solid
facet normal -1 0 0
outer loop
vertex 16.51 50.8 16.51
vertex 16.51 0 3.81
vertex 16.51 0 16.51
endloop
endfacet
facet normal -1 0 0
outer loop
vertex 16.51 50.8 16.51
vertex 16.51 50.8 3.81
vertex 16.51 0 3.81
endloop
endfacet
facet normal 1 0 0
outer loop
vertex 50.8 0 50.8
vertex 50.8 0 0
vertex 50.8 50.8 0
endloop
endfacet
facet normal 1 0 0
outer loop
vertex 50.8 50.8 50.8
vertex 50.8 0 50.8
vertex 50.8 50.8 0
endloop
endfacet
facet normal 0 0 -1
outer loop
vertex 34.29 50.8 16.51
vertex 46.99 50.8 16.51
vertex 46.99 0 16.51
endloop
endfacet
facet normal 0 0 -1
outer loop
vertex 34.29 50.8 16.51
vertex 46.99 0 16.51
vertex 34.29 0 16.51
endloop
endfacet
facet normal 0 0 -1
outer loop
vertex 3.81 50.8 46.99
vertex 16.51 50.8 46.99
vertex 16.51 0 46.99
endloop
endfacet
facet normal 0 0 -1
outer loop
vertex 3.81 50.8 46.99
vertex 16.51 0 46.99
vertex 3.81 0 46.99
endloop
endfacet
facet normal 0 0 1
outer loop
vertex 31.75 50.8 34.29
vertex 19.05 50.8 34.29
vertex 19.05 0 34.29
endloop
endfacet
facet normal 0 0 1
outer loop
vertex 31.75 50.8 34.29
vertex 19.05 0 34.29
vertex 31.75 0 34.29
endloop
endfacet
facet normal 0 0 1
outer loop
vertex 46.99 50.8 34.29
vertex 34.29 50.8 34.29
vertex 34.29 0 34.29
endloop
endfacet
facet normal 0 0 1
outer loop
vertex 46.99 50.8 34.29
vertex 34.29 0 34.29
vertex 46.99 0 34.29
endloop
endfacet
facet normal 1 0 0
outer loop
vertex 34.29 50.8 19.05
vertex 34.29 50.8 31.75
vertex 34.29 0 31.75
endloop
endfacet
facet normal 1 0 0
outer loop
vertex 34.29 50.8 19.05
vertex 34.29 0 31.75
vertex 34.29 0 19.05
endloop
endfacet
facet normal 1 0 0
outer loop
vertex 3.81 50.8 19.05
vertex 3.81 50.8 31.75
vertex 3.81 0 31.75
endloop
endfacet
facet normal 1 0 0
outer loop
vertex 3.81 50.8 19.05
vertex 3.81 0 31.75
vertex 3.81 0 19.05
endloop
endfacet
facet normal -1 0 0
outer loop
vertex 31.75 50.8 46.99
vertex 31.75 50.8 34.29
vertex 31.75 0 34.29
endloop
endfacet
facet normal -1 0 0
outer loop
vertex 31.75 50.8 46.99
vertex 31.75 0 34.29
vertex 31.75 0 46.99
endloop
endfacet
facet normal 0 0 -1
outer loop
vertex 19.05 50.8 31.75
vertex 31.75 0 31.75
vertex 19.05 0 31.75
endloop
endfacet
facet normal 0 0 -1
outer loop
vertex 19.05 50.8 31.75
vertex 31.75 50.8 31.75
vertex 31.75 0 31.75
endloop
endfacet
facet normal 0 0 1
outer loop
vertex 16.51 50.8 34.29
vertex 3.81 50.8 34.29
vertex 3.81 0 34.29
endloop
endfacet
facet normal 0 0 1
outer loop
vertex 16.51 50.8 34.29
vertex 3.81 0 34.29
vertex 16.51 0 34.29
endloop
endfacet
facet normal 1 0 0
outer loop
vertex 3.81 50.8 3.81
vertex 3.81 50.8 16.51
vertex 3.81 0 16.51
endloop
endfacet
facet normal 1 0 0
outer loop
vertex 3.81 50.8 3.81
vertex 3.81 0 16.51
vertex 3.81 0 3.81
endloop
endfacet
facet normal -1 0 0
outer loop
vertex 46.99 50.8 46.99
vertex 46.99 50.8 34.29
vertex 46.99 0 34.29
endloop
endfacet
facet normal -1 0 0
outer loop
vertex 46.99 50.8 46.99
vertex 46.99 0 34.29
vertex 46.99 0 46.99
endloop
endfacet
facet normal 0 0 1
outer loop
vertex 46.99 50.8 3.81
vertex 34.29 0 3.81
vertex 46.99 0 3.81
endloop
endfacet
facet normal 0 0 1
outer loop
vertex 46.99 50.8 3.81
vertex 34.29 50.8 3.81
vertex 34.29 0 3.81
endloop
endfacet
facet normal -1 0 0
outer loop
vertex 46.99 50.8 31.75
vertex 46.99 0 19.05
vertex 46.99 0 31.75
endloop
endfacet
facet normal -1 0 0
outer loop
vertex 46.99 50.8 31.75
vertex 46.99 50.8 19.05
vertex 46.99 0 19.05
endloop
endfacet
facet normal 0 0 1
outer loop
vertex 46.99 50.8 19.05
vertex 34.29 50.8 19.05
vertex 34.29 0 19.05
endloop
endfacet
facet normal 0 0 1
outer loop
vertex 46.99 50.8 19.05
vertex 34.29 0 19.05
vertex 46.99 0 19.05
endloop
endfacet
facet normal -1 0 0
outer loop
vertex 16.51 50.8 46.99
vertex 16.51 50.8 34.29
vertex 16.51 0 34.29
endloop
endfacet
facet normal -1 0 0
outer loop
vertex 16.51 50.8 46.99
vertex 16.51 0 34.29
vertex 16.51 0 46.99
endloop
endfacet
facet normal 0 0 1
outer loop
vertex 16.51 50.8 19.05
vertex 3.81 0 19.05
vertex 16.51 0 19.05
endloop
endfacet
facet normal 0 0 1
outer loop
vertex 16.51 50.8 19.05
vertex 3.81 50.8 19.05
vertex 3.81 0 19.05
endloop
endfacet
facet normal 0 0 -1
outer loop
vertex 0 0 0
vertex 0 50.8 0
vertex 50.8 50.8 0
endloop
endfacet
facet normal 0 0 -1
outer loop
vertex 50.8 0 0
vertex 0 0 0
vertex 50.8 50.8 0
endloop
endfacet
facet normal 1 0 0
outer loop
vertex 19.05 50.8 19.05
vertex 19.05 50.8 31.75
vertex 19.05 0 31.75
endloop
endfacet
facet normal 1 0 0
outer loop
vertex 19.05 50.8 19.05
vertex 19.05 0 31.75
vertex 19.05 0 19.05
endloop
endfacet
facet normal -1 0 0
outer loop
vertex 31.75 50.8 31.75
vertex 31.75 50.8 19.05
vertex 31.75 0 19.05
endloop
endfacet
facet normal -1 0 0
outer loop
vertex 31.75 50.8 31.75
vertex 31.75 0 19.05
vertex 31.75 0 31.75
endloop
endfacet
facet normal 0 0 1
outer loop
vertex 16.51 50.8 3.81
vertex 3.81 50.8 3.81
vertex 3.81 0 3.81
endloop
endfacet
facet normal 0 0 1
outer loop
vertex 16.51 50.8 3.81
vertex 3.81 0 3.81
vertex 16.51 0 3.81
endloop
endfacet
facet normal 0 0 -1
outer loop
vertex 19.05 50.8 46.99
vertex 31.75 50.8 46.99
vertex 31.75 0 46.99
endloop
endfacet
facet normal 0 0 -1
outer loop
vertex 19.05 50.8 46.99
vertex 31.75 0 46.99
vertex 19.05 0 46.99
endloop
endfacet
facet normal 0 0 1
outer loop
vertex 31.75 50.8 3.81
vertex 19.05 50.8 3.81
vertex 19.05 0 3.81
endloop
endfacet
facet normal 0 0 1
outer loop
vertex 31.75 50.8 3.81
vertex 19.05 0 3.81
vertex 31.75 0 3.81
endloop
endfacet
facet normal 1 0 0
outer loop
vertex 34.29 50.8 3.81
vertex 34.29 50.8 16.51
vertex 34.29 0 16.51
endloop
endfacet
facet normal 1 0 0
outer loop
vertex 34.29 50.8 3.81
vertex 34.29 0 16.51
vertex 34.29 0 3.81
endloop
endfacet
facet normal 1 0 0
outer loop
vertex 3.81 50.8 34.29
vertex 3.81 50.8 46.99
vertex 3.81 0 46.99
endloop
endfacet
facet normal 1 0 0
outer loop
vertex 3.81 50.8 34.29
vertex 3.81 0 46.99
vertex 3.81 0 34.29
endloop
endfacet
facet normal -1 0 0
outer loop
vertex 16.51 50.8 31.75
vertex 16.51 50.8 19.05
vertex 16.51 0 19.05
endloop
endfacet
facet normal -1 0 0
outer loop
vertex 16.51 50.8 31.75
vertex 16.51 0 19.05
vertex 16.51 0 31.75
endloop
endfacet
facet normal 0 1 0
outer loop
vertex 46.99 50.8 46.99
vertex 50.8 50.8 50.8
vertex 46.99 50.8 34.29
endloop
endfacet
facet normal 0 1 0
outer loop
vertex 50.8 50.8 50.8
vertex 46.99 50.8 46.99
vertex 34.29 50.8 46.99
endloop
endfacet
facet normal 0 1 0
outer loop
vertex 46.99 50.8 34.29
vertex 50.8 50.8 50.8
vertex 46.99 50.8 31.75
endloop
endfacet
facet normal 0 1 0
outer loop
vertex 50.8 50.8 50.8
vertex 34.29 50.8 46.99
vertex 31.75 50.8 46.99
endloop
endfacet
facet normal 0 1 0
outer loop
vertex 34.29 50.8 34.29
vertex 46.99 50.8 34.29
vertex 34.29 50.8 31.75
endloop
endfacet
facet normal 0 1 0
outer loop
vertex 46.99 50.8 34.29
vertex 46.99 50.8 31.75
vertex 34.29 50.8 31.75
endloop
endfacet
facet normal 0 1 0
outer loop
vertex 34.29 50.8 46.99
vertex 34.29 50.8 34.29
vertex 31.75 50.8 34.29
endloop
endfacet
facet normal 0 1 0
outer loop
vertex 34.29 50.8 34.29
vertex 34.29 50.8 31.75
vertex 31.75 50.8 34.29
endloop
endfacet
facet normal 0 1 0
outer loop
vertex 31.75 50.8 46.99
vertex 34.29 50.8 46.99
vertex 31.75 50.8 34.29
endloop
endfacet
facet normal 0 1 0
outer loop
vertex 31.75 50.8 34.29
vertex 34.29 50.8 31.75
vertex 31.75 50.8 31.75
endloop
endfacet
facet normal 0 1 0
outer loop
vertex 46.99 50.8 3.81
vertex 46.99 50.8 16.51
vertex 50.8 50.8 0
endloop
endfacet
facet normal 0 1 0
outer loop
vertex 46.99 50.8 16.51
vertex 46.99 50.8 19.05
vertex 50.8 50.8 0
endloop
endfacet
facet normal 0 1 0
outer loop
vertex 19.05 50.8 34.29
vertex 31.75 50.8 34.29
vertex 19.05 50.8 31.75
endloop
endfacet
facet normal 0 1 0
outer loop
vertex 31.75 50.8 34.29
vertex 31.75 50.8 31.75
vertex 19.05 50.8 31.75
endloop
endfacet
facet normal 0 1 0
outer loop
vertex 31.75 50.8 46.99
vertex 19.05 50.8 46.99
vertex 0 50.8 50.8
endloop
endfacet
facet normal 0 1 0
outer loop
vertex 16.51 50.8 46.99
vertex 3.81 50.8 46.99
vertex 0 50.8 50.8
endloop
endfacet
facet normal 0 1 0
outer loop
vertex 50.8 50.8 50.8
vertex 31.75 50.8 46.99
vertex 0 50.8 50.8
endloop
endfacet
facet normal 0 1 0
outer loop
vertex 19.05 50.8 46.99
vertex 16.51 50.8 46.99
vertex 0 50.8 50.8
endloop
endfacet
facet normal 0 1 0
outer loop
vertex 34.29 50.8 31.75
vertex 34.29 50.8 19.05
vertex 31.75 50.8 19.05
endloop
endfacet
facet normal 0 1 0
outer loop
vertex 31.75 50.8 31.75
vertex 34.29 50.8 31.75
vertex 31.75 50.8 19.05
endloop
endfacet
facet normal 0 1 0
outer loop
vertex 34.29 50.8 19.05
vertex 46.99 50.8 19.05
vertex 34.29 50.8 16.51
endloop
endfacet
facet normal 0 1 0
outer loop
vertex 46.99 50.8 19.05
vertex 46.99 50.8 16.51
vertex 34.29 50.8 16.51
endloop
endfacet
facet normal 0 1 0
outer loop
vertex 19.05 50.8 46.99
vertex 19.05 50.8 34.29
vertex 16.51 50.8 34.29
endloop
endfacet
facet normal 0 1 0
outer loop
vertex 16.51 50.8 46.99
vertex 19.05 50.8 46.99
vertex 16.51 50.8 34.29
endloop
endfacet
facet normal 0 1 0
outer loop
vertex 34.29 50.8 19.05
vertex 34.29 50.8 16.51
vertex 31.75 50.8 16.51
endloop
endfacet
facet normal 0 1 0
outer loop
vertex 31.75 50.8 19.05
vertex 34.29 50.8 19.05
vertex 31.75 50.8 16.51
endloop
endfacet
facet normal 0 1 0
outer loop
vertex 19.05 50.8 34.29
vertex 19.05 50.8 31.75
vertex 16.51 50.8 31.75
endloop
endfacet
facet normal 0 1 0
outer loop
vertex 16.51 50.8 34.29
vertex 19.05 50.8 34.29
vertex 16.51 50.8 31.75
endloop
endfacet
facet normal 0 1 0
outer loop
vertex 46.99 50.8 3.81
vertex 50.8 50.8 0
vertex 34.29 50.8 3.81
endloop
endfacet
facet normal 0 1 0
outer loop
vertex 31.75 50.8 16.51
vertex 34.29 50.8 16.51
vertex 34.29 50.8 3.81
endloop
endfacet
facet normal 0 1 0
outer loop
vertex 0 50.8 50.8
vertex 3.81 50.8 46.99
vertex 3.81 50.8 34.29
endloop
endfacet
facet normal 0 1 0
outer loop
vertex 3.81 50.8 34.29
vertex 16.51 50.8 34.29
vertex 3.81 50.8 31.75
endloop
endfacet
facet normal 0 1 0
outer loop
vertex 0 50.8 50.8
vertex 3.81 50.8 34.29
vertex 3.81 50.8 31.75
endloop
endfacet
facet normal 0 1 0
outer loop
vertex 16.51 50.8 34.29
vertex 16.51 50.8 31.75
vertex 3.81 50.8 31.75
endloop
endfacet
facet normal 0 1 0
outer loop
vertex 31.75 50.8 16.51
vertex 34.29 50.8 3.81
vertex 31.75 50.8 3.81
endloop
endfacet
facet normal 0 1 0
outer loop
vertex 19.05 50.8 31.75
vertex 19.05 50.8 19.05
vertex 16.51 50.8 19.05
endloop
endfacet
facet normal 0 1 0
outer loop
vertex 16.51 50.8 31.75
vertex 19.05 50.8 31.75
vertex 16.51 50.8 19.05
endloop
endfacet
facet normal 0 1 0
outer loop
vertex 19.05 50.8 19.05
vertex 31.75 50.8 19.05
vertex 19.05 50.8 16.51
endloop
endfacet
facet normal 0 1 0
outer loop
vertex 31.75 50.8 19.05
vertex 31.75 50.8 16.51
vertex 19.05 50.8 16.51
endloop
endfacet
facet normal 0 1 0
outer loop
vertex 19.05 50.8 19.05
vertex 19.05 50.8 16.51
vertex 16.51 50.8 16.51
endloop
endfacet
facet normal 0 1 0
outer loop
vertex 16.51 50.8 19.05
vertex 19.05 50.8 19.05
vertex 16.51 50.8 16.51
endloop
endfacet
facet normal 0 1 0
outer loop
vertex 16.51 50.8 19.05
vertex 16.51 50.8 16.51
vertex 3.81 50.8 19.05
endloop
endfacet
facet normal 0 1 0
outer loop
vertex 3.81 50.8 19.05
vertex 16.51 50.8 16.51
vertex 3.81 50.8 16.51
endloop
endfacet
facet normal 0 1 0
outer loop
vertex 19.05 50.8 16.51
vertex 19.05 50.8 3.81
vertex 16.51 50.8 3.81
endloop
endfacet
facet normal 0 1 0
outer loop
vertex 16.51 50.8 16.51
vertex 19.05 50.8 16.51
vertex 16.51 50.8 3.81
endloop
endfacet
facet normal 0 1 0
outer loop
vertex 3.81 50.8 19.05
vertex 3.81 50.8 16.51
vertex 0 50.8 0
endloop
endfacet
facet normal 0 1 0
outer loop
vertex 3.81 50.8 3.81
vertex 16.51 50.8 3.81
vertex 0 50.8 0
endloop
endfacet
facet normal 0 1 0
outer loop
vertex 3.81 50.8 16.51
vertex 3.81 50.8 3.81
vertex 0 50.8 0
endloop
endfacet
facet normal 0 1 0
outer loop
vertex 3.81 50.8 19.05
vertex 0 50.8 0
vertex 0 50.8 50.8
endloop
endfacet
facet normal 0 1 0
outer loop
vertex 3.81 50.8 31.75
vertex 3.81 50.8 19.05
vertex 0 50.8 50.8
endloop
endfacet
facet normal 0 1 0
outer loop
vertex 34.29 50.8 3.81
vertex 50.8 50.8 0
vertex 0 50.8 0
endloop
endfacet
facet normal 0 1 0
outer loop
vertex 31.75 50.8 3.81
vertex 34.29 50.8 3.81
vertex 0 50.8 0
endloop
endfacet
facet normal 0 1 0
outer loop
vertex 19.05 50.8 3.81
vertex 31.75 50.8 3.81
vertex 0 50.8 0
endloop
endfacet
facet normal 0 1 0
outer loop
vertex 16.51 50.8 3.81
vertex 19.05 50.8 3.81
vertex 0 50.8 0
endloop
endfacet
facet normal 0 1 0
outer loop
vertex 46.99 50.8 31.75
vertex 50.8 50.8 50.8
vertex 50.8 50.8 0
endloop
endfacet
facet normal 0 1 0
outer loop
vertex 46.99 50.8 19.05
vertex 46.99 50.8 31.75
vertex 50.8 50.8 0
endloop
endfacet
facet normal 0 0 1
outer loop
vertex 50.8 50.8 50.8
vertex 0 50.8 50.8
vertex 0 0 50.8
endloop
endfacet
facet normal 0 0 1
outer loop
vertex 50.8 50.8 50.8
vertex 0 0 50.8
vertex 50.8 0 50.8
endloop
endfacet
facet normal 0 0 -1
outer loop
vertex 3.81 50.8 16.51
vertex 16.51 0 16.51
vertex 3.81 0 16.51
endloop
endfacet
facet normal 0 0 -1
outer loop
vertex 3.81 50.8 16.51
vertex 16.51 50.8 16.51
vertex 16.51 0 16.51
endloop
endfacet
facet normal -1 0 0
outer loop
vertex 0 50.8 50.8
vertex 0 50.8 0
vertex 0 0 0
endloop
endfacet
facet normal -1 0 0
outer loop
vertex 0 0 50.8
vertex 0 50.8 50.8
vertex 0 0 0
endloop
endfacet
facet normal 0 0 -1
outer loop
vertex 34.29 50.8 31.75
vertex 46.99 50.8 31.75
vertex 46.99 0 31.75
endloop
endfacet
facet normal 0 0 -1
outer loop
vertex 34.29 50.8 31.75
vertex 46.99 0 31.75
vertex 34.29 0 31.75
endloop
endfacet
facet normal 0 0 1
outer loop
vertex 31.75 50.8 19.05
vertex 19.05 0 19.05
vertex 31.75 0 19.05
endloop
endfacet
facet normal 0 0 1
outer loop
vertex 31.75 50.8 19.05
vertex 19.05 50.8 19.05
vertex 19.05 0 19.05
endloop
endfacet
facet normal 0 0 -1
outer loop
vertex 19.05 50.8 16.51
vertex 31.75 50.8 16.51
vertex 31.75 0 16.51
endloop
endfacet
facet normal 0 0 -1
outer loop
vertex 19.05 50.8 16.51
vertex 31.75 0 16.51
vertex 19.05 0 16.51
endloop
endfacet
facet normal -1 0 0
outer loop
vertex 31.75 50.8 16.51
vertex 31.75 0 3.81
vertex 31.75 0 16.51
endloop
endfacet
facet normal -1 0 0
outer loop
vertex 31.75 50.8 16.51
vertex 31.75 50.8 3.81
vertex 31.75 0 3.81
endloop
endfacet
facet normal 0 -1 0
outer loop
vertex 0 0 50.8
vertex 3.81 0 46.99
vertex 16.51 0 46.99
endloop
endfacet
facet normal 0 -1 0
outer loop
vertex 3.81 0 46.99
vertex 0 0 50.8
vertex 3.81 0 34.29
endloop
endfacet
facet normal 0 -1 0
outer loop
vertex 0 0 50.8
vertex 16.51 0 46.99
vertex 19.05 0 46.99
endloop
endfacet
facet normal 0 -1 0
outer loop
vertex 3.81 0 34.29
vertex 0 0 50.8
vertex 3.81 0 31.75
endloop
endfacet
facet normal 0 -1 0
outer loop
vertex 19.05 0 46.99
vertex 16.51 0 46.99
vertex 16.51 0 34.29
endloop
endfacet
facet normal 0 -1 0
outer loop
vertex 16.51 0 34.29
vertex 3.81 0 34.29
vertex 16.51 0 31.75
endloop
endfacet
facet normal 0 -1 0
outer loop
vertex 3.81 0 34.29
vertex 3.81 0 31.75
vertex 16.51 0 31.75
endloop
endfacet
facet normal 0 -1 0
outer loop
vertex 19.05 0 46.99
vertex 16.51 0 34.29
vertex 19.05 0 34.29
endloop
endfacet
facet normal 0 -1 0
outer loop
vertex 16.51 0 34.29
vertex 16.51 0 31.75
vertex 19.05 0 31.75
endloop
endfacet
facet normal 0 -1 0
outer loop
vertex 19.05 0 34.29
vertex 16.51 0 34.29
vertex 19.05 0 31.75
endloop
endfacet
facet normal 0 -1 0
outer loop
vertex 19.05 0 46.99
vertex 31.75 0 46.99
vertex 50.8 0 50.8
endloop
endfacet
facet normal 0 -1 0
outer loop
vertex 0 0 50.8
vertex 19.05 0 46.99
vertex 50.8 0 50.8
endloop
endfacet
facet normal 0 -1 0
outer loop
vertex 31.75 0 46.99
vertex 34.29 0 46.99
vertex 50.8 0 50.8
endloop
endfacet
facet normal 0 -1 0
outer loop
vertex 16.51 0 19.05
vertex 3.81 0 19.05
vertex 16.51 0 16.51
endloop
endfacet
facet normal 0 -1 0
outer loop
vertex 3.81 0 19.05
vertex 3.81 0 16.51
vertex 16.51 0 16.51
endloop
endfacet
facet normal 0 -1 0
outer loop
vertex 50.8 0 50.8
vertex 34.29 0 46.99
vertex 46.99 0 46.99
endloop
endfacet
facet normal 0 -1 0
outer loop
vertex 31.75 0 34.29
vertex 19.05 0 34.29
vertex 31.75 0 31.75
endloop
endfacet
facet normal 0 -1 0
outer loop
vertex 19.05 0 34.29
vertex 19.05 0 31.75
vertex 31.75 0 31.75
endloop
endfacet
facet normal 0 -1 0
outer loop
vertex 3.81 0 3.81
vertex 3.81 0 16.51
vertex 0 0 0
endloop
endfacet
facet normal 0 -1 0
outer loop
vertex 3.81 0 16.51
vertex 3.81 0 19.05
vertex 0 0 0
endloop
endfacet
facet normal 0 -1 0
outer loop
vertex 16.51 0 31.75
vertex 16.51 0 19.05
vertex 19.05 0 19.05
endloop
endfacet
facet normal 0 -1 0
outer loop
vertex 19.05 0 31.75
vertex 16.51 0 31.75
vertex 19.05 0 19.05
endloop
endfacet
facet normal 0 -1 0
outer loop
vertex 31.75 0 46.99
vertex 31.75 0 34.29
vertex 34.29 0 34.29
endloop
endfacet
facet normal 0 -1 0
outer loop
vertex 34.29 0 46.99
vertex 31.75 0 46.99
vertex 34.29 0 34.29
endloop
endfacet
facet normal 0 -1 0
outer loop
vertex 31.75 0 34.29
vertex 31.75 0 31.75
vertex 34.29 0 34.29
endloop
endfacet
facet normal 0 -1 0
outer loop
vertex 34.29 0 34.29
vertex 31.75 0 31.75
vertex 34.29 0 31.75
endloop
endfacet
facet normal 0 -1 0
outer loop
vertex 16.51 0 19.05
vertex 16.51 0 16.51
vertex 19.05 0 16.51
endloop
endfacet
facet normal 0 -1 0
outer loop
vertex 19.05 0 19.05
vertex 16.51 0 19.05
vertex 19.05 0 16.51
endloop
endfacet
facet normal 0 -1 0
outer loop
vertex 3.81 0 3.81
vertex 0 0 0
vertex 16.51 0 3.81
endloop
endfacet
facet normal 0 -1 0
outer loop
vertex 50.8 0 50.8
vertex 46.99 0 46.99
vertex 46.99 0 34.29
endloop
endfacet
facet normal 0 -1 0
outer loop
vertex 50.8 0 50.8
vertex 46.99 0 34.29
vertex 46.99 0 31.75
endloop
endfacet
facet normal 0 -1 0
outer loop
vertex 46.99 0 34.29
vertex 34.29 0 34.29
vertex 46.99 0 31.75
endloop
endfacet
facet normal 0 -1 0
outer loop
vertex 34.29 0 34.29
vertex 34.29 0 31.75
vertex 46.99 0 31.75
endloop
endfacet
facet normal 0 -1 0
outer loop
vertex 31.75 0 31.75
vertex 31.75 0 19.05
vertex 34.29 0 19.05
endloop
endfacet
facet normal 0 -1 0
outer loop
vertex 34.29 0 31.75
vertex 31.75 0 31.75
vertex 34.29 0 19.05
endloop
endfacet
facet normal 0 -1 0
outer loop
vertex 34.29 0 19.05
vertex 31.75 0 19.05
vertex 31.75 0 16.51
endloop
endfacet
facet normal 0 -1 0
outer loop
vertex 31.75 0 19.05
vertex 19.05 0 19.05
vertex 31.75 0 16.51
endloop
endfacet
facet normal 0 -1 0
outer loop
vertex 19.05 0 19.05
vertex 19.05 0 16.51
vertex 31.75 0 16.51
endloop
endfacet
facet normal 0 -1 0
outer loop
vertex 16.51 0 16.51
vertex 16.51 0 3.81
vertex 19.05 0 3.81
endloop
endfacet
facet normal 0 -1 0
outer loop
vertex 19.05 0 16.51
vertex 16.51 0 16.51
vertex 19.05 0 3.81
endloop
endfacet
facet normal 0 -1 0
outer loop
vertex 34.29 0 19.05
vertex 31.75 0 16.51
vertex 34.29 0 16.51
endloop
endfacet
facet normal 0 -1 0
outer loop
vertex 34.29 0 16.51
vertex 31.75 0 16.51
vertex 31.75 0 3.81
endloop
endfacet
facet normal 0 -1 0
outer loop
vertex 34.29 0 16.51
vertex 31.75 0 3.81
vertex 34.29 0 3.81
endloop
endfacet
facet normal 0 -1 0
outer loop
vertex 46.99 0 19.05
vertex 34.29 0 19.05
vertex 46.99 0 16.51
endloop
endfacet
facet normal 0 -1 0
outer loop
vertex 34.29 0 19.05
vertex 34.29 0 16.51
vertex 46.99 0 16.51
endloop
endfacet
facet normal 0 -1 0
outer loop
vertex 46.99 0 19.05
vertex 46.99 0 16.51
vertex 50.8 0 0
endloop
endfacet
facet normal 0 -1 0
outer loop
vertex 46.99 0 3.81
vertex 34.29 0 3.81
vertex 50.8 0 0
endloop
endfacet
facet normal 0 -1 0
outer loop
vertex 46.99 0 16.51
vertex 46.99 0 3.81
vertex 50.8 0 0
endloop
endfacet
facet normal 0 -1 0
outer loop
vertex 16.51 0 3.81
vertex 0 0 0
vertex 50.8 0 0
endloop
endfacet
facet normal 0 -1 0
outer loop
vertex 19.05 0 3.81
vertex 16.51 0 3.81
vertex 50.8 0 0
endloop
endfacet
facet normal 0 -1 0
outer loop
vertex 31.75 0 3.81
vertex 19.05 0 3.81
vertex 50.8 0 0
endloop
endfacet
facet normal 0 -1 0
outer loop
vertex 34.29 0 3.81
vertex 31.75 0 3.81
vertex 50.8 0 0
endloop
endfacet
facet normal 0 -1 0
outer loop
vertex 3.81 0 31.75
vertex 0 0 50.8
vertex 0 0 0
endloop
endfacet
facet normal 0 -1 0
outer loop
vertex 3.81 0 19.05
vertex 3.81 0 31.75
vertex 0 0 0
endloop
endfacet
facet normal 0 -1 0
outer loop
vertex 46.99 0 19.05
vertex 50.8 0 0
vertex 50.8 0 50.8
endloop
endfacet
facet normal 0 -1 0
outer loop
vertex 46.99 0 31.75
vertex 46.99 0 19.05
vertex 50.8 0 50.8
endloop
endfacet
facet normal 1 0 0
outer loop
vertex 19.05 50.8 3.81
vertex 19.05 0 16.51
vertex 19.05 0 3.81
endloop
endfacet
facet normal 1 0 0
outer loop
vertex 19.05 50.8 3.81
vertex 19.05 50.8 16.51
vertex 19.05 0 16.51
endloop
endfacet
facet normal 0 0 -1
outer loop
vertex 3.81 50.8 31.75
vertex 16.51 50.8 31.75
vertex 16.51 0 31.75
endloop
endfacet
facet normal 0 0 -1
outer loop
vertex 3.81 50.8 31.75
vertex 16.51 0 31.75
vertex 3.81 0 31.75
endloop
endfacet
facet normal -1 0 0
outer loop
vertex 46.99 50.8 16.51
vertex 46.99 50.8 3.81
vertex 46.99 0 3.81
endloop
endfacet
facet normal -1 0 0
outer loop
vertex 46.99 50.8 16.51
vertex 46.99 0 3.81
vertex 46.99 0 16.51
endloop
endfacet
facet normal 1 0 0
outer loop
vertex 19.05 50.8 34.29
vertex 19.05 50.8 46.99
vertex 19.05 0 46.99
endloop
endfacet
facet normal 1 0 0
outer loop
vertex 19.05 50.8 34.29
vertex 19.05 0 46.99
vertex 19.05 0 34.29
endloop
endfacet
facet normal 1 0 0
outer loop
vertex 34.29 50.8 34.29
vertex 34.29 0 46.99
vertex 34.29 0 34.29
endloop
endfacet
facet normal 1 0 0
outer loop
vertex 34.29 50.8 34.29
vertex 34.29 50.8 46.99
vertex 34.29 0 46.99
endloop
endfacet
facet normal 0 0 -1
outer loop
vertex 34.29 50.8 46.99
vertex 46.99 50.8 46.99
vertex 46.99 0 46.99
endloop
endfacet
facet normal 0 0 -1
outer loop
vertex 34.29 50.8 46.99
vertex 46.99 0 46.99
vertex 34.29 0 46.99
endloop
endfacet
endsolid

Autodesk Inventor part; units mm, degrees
ref_plane "YZ Plane" through (0, 0, 0) normal (1, 0, 0) x (0, 1, 0)
ref_plane "XZ Plane" through (0, 0, 0) normal (0, 1, 0) x (-1, 0, 0)
ref_plane "XY Plane" through (0, 0, 0) normal (0, 0, 1) x (1, 0, 0)
sketch "Sketch1" plane through (0, 0, 0) normal (0, 0, 1) x (1, 0, 0)
  line L0 (0, 0) -> (50.8, 0)
  line L1 (50.8, 0) -> (50.8, 50.8)
  line L2 (50.8, 50.8) -> (0, 50.8)
  line L3 (0, 50.8) -> (0, 0)
  dimension "d0" = 50.8
  dimension "d1" = 50.8
extrude "Extrusion1" add sketch "Sketch1" along normal blind 50.8
sketch "Sketch2" plane through (0, 50.8, 0) normal (0, 1, 0) x (1, 0, 0)
  line L0 (50.8, 0) -> (0, 0) projected
  line L1 (0, 0) -> (0, -50.8) projected
  line L2 (50.8, -50.8) -> (0, -50.8) projected
  line L3 (50.8, 0) -> (50.8, -50.8) projected
  line L4 (46.99, -46.99) -> (34.29, -46.99)
  line L5 (34.29, -46.99) -> (34.29, -34.29)
  line L6 (34.29, -34.29) -> (46.99, -34.29)
  line L7 (46.99, -34.29) -> (46.99, -46.99)
  line L8 (19.05, -46.99) -> (19.05, -34.29)
  line L9 (19.05, -34.29) -> (31.75, -34.29)
  line L10 (31.75, -34.29) -> (31.75, -46.99)
  line L11 (31.75, -46.99) -> (19.05, -46.99)
  line L12 (3.81, -46.99) -> (3.81, -34.29)
  line L13 (3.81, -34.29) -> (16.51, -34.29)
  line L14 (16.51, -34.29) -> (16.51, -46.99)
  line L15 (16.51, -46.99) -> (3.81, -46.99)
  line L16 (34.29, -31.75) -> (34.29, -19.05)
  line L17 (34.29, -19.05) -> (46.99, -19.05)
  line L18 (46.99, -19.05) -> (46.99, -31.75)
  line L19 (46.99, -31.75) -> (34.29, -31.75)
  line L20 (19.05, -31.75) -> (19.05, -19.05)
  line L21 (19.05, -19.05) -> (31.75, -19.05)
  line L22 (31.75, -19.05) -> (31.75, -31.75)
  line L23 (31.75, -31.75) -> (19.05, -31.75)
  line L24 (3.81, -31.75) -> (3.81, -19.05)
  line L25 (3.81, -19.05) -> (16.51, -19.05)
  line L26 (16.51, -19.05) -> (16.51, -31.75)
  line L27 (16.51, -31.75) -> (3.81, -31.75)
  line L28 (34.29, -16.51) -> (34.29, -3.81)
  line L29 (34.29, -3.81) -> (46.99, -3.81)
  line L30 (46.99, -3.81) -> (46.99, -16.51)
  line L31 (46.99, -16.51) -> (34.29, -16.51)
  line L32 (19.05, -16.51) -> (19.05, -3.81)
  line L33 (19.05, -3.81) -> (31.75, -3.81)
  line L34 (31.75, -3.81) -> (31.75, -16.51)
  line L35 (31.75, -16.51) -> (19.05, -16.51)
  line L36 (3.81, -16.51) -> (3.81, -3.81)
  line L37 (3.81, -3.81) -> (16.51, -3.81)
  line L38 (16.51, -3.81) -> (16.51, -16.51)
  line L39 (16.51, -16.51) -> (3.81, -16.51)
  dimension "d4" = 12.7
  dimension "d5" = 12.7
  dimension "d6" = 3.81
  dimension "d7" = 3.81
  dimension "d10" = 15.24
  dimension "d13" = 15.24
extrude "Extrusion2" cut sketch "Sketch2" against normal through all contours L4 L5 L6 L7 | L8 L9 L10 L11 | L12 L13 L14 L15 | L16 L17 L18 L19 | L20 L21 L22 L23 | L24 L25 L26 L27 | L28 L29 L30 L31 | L32 L33 L34 L35 | L36 L37 L38 L39
properties part number "Gold" material "UHMW, Black"
